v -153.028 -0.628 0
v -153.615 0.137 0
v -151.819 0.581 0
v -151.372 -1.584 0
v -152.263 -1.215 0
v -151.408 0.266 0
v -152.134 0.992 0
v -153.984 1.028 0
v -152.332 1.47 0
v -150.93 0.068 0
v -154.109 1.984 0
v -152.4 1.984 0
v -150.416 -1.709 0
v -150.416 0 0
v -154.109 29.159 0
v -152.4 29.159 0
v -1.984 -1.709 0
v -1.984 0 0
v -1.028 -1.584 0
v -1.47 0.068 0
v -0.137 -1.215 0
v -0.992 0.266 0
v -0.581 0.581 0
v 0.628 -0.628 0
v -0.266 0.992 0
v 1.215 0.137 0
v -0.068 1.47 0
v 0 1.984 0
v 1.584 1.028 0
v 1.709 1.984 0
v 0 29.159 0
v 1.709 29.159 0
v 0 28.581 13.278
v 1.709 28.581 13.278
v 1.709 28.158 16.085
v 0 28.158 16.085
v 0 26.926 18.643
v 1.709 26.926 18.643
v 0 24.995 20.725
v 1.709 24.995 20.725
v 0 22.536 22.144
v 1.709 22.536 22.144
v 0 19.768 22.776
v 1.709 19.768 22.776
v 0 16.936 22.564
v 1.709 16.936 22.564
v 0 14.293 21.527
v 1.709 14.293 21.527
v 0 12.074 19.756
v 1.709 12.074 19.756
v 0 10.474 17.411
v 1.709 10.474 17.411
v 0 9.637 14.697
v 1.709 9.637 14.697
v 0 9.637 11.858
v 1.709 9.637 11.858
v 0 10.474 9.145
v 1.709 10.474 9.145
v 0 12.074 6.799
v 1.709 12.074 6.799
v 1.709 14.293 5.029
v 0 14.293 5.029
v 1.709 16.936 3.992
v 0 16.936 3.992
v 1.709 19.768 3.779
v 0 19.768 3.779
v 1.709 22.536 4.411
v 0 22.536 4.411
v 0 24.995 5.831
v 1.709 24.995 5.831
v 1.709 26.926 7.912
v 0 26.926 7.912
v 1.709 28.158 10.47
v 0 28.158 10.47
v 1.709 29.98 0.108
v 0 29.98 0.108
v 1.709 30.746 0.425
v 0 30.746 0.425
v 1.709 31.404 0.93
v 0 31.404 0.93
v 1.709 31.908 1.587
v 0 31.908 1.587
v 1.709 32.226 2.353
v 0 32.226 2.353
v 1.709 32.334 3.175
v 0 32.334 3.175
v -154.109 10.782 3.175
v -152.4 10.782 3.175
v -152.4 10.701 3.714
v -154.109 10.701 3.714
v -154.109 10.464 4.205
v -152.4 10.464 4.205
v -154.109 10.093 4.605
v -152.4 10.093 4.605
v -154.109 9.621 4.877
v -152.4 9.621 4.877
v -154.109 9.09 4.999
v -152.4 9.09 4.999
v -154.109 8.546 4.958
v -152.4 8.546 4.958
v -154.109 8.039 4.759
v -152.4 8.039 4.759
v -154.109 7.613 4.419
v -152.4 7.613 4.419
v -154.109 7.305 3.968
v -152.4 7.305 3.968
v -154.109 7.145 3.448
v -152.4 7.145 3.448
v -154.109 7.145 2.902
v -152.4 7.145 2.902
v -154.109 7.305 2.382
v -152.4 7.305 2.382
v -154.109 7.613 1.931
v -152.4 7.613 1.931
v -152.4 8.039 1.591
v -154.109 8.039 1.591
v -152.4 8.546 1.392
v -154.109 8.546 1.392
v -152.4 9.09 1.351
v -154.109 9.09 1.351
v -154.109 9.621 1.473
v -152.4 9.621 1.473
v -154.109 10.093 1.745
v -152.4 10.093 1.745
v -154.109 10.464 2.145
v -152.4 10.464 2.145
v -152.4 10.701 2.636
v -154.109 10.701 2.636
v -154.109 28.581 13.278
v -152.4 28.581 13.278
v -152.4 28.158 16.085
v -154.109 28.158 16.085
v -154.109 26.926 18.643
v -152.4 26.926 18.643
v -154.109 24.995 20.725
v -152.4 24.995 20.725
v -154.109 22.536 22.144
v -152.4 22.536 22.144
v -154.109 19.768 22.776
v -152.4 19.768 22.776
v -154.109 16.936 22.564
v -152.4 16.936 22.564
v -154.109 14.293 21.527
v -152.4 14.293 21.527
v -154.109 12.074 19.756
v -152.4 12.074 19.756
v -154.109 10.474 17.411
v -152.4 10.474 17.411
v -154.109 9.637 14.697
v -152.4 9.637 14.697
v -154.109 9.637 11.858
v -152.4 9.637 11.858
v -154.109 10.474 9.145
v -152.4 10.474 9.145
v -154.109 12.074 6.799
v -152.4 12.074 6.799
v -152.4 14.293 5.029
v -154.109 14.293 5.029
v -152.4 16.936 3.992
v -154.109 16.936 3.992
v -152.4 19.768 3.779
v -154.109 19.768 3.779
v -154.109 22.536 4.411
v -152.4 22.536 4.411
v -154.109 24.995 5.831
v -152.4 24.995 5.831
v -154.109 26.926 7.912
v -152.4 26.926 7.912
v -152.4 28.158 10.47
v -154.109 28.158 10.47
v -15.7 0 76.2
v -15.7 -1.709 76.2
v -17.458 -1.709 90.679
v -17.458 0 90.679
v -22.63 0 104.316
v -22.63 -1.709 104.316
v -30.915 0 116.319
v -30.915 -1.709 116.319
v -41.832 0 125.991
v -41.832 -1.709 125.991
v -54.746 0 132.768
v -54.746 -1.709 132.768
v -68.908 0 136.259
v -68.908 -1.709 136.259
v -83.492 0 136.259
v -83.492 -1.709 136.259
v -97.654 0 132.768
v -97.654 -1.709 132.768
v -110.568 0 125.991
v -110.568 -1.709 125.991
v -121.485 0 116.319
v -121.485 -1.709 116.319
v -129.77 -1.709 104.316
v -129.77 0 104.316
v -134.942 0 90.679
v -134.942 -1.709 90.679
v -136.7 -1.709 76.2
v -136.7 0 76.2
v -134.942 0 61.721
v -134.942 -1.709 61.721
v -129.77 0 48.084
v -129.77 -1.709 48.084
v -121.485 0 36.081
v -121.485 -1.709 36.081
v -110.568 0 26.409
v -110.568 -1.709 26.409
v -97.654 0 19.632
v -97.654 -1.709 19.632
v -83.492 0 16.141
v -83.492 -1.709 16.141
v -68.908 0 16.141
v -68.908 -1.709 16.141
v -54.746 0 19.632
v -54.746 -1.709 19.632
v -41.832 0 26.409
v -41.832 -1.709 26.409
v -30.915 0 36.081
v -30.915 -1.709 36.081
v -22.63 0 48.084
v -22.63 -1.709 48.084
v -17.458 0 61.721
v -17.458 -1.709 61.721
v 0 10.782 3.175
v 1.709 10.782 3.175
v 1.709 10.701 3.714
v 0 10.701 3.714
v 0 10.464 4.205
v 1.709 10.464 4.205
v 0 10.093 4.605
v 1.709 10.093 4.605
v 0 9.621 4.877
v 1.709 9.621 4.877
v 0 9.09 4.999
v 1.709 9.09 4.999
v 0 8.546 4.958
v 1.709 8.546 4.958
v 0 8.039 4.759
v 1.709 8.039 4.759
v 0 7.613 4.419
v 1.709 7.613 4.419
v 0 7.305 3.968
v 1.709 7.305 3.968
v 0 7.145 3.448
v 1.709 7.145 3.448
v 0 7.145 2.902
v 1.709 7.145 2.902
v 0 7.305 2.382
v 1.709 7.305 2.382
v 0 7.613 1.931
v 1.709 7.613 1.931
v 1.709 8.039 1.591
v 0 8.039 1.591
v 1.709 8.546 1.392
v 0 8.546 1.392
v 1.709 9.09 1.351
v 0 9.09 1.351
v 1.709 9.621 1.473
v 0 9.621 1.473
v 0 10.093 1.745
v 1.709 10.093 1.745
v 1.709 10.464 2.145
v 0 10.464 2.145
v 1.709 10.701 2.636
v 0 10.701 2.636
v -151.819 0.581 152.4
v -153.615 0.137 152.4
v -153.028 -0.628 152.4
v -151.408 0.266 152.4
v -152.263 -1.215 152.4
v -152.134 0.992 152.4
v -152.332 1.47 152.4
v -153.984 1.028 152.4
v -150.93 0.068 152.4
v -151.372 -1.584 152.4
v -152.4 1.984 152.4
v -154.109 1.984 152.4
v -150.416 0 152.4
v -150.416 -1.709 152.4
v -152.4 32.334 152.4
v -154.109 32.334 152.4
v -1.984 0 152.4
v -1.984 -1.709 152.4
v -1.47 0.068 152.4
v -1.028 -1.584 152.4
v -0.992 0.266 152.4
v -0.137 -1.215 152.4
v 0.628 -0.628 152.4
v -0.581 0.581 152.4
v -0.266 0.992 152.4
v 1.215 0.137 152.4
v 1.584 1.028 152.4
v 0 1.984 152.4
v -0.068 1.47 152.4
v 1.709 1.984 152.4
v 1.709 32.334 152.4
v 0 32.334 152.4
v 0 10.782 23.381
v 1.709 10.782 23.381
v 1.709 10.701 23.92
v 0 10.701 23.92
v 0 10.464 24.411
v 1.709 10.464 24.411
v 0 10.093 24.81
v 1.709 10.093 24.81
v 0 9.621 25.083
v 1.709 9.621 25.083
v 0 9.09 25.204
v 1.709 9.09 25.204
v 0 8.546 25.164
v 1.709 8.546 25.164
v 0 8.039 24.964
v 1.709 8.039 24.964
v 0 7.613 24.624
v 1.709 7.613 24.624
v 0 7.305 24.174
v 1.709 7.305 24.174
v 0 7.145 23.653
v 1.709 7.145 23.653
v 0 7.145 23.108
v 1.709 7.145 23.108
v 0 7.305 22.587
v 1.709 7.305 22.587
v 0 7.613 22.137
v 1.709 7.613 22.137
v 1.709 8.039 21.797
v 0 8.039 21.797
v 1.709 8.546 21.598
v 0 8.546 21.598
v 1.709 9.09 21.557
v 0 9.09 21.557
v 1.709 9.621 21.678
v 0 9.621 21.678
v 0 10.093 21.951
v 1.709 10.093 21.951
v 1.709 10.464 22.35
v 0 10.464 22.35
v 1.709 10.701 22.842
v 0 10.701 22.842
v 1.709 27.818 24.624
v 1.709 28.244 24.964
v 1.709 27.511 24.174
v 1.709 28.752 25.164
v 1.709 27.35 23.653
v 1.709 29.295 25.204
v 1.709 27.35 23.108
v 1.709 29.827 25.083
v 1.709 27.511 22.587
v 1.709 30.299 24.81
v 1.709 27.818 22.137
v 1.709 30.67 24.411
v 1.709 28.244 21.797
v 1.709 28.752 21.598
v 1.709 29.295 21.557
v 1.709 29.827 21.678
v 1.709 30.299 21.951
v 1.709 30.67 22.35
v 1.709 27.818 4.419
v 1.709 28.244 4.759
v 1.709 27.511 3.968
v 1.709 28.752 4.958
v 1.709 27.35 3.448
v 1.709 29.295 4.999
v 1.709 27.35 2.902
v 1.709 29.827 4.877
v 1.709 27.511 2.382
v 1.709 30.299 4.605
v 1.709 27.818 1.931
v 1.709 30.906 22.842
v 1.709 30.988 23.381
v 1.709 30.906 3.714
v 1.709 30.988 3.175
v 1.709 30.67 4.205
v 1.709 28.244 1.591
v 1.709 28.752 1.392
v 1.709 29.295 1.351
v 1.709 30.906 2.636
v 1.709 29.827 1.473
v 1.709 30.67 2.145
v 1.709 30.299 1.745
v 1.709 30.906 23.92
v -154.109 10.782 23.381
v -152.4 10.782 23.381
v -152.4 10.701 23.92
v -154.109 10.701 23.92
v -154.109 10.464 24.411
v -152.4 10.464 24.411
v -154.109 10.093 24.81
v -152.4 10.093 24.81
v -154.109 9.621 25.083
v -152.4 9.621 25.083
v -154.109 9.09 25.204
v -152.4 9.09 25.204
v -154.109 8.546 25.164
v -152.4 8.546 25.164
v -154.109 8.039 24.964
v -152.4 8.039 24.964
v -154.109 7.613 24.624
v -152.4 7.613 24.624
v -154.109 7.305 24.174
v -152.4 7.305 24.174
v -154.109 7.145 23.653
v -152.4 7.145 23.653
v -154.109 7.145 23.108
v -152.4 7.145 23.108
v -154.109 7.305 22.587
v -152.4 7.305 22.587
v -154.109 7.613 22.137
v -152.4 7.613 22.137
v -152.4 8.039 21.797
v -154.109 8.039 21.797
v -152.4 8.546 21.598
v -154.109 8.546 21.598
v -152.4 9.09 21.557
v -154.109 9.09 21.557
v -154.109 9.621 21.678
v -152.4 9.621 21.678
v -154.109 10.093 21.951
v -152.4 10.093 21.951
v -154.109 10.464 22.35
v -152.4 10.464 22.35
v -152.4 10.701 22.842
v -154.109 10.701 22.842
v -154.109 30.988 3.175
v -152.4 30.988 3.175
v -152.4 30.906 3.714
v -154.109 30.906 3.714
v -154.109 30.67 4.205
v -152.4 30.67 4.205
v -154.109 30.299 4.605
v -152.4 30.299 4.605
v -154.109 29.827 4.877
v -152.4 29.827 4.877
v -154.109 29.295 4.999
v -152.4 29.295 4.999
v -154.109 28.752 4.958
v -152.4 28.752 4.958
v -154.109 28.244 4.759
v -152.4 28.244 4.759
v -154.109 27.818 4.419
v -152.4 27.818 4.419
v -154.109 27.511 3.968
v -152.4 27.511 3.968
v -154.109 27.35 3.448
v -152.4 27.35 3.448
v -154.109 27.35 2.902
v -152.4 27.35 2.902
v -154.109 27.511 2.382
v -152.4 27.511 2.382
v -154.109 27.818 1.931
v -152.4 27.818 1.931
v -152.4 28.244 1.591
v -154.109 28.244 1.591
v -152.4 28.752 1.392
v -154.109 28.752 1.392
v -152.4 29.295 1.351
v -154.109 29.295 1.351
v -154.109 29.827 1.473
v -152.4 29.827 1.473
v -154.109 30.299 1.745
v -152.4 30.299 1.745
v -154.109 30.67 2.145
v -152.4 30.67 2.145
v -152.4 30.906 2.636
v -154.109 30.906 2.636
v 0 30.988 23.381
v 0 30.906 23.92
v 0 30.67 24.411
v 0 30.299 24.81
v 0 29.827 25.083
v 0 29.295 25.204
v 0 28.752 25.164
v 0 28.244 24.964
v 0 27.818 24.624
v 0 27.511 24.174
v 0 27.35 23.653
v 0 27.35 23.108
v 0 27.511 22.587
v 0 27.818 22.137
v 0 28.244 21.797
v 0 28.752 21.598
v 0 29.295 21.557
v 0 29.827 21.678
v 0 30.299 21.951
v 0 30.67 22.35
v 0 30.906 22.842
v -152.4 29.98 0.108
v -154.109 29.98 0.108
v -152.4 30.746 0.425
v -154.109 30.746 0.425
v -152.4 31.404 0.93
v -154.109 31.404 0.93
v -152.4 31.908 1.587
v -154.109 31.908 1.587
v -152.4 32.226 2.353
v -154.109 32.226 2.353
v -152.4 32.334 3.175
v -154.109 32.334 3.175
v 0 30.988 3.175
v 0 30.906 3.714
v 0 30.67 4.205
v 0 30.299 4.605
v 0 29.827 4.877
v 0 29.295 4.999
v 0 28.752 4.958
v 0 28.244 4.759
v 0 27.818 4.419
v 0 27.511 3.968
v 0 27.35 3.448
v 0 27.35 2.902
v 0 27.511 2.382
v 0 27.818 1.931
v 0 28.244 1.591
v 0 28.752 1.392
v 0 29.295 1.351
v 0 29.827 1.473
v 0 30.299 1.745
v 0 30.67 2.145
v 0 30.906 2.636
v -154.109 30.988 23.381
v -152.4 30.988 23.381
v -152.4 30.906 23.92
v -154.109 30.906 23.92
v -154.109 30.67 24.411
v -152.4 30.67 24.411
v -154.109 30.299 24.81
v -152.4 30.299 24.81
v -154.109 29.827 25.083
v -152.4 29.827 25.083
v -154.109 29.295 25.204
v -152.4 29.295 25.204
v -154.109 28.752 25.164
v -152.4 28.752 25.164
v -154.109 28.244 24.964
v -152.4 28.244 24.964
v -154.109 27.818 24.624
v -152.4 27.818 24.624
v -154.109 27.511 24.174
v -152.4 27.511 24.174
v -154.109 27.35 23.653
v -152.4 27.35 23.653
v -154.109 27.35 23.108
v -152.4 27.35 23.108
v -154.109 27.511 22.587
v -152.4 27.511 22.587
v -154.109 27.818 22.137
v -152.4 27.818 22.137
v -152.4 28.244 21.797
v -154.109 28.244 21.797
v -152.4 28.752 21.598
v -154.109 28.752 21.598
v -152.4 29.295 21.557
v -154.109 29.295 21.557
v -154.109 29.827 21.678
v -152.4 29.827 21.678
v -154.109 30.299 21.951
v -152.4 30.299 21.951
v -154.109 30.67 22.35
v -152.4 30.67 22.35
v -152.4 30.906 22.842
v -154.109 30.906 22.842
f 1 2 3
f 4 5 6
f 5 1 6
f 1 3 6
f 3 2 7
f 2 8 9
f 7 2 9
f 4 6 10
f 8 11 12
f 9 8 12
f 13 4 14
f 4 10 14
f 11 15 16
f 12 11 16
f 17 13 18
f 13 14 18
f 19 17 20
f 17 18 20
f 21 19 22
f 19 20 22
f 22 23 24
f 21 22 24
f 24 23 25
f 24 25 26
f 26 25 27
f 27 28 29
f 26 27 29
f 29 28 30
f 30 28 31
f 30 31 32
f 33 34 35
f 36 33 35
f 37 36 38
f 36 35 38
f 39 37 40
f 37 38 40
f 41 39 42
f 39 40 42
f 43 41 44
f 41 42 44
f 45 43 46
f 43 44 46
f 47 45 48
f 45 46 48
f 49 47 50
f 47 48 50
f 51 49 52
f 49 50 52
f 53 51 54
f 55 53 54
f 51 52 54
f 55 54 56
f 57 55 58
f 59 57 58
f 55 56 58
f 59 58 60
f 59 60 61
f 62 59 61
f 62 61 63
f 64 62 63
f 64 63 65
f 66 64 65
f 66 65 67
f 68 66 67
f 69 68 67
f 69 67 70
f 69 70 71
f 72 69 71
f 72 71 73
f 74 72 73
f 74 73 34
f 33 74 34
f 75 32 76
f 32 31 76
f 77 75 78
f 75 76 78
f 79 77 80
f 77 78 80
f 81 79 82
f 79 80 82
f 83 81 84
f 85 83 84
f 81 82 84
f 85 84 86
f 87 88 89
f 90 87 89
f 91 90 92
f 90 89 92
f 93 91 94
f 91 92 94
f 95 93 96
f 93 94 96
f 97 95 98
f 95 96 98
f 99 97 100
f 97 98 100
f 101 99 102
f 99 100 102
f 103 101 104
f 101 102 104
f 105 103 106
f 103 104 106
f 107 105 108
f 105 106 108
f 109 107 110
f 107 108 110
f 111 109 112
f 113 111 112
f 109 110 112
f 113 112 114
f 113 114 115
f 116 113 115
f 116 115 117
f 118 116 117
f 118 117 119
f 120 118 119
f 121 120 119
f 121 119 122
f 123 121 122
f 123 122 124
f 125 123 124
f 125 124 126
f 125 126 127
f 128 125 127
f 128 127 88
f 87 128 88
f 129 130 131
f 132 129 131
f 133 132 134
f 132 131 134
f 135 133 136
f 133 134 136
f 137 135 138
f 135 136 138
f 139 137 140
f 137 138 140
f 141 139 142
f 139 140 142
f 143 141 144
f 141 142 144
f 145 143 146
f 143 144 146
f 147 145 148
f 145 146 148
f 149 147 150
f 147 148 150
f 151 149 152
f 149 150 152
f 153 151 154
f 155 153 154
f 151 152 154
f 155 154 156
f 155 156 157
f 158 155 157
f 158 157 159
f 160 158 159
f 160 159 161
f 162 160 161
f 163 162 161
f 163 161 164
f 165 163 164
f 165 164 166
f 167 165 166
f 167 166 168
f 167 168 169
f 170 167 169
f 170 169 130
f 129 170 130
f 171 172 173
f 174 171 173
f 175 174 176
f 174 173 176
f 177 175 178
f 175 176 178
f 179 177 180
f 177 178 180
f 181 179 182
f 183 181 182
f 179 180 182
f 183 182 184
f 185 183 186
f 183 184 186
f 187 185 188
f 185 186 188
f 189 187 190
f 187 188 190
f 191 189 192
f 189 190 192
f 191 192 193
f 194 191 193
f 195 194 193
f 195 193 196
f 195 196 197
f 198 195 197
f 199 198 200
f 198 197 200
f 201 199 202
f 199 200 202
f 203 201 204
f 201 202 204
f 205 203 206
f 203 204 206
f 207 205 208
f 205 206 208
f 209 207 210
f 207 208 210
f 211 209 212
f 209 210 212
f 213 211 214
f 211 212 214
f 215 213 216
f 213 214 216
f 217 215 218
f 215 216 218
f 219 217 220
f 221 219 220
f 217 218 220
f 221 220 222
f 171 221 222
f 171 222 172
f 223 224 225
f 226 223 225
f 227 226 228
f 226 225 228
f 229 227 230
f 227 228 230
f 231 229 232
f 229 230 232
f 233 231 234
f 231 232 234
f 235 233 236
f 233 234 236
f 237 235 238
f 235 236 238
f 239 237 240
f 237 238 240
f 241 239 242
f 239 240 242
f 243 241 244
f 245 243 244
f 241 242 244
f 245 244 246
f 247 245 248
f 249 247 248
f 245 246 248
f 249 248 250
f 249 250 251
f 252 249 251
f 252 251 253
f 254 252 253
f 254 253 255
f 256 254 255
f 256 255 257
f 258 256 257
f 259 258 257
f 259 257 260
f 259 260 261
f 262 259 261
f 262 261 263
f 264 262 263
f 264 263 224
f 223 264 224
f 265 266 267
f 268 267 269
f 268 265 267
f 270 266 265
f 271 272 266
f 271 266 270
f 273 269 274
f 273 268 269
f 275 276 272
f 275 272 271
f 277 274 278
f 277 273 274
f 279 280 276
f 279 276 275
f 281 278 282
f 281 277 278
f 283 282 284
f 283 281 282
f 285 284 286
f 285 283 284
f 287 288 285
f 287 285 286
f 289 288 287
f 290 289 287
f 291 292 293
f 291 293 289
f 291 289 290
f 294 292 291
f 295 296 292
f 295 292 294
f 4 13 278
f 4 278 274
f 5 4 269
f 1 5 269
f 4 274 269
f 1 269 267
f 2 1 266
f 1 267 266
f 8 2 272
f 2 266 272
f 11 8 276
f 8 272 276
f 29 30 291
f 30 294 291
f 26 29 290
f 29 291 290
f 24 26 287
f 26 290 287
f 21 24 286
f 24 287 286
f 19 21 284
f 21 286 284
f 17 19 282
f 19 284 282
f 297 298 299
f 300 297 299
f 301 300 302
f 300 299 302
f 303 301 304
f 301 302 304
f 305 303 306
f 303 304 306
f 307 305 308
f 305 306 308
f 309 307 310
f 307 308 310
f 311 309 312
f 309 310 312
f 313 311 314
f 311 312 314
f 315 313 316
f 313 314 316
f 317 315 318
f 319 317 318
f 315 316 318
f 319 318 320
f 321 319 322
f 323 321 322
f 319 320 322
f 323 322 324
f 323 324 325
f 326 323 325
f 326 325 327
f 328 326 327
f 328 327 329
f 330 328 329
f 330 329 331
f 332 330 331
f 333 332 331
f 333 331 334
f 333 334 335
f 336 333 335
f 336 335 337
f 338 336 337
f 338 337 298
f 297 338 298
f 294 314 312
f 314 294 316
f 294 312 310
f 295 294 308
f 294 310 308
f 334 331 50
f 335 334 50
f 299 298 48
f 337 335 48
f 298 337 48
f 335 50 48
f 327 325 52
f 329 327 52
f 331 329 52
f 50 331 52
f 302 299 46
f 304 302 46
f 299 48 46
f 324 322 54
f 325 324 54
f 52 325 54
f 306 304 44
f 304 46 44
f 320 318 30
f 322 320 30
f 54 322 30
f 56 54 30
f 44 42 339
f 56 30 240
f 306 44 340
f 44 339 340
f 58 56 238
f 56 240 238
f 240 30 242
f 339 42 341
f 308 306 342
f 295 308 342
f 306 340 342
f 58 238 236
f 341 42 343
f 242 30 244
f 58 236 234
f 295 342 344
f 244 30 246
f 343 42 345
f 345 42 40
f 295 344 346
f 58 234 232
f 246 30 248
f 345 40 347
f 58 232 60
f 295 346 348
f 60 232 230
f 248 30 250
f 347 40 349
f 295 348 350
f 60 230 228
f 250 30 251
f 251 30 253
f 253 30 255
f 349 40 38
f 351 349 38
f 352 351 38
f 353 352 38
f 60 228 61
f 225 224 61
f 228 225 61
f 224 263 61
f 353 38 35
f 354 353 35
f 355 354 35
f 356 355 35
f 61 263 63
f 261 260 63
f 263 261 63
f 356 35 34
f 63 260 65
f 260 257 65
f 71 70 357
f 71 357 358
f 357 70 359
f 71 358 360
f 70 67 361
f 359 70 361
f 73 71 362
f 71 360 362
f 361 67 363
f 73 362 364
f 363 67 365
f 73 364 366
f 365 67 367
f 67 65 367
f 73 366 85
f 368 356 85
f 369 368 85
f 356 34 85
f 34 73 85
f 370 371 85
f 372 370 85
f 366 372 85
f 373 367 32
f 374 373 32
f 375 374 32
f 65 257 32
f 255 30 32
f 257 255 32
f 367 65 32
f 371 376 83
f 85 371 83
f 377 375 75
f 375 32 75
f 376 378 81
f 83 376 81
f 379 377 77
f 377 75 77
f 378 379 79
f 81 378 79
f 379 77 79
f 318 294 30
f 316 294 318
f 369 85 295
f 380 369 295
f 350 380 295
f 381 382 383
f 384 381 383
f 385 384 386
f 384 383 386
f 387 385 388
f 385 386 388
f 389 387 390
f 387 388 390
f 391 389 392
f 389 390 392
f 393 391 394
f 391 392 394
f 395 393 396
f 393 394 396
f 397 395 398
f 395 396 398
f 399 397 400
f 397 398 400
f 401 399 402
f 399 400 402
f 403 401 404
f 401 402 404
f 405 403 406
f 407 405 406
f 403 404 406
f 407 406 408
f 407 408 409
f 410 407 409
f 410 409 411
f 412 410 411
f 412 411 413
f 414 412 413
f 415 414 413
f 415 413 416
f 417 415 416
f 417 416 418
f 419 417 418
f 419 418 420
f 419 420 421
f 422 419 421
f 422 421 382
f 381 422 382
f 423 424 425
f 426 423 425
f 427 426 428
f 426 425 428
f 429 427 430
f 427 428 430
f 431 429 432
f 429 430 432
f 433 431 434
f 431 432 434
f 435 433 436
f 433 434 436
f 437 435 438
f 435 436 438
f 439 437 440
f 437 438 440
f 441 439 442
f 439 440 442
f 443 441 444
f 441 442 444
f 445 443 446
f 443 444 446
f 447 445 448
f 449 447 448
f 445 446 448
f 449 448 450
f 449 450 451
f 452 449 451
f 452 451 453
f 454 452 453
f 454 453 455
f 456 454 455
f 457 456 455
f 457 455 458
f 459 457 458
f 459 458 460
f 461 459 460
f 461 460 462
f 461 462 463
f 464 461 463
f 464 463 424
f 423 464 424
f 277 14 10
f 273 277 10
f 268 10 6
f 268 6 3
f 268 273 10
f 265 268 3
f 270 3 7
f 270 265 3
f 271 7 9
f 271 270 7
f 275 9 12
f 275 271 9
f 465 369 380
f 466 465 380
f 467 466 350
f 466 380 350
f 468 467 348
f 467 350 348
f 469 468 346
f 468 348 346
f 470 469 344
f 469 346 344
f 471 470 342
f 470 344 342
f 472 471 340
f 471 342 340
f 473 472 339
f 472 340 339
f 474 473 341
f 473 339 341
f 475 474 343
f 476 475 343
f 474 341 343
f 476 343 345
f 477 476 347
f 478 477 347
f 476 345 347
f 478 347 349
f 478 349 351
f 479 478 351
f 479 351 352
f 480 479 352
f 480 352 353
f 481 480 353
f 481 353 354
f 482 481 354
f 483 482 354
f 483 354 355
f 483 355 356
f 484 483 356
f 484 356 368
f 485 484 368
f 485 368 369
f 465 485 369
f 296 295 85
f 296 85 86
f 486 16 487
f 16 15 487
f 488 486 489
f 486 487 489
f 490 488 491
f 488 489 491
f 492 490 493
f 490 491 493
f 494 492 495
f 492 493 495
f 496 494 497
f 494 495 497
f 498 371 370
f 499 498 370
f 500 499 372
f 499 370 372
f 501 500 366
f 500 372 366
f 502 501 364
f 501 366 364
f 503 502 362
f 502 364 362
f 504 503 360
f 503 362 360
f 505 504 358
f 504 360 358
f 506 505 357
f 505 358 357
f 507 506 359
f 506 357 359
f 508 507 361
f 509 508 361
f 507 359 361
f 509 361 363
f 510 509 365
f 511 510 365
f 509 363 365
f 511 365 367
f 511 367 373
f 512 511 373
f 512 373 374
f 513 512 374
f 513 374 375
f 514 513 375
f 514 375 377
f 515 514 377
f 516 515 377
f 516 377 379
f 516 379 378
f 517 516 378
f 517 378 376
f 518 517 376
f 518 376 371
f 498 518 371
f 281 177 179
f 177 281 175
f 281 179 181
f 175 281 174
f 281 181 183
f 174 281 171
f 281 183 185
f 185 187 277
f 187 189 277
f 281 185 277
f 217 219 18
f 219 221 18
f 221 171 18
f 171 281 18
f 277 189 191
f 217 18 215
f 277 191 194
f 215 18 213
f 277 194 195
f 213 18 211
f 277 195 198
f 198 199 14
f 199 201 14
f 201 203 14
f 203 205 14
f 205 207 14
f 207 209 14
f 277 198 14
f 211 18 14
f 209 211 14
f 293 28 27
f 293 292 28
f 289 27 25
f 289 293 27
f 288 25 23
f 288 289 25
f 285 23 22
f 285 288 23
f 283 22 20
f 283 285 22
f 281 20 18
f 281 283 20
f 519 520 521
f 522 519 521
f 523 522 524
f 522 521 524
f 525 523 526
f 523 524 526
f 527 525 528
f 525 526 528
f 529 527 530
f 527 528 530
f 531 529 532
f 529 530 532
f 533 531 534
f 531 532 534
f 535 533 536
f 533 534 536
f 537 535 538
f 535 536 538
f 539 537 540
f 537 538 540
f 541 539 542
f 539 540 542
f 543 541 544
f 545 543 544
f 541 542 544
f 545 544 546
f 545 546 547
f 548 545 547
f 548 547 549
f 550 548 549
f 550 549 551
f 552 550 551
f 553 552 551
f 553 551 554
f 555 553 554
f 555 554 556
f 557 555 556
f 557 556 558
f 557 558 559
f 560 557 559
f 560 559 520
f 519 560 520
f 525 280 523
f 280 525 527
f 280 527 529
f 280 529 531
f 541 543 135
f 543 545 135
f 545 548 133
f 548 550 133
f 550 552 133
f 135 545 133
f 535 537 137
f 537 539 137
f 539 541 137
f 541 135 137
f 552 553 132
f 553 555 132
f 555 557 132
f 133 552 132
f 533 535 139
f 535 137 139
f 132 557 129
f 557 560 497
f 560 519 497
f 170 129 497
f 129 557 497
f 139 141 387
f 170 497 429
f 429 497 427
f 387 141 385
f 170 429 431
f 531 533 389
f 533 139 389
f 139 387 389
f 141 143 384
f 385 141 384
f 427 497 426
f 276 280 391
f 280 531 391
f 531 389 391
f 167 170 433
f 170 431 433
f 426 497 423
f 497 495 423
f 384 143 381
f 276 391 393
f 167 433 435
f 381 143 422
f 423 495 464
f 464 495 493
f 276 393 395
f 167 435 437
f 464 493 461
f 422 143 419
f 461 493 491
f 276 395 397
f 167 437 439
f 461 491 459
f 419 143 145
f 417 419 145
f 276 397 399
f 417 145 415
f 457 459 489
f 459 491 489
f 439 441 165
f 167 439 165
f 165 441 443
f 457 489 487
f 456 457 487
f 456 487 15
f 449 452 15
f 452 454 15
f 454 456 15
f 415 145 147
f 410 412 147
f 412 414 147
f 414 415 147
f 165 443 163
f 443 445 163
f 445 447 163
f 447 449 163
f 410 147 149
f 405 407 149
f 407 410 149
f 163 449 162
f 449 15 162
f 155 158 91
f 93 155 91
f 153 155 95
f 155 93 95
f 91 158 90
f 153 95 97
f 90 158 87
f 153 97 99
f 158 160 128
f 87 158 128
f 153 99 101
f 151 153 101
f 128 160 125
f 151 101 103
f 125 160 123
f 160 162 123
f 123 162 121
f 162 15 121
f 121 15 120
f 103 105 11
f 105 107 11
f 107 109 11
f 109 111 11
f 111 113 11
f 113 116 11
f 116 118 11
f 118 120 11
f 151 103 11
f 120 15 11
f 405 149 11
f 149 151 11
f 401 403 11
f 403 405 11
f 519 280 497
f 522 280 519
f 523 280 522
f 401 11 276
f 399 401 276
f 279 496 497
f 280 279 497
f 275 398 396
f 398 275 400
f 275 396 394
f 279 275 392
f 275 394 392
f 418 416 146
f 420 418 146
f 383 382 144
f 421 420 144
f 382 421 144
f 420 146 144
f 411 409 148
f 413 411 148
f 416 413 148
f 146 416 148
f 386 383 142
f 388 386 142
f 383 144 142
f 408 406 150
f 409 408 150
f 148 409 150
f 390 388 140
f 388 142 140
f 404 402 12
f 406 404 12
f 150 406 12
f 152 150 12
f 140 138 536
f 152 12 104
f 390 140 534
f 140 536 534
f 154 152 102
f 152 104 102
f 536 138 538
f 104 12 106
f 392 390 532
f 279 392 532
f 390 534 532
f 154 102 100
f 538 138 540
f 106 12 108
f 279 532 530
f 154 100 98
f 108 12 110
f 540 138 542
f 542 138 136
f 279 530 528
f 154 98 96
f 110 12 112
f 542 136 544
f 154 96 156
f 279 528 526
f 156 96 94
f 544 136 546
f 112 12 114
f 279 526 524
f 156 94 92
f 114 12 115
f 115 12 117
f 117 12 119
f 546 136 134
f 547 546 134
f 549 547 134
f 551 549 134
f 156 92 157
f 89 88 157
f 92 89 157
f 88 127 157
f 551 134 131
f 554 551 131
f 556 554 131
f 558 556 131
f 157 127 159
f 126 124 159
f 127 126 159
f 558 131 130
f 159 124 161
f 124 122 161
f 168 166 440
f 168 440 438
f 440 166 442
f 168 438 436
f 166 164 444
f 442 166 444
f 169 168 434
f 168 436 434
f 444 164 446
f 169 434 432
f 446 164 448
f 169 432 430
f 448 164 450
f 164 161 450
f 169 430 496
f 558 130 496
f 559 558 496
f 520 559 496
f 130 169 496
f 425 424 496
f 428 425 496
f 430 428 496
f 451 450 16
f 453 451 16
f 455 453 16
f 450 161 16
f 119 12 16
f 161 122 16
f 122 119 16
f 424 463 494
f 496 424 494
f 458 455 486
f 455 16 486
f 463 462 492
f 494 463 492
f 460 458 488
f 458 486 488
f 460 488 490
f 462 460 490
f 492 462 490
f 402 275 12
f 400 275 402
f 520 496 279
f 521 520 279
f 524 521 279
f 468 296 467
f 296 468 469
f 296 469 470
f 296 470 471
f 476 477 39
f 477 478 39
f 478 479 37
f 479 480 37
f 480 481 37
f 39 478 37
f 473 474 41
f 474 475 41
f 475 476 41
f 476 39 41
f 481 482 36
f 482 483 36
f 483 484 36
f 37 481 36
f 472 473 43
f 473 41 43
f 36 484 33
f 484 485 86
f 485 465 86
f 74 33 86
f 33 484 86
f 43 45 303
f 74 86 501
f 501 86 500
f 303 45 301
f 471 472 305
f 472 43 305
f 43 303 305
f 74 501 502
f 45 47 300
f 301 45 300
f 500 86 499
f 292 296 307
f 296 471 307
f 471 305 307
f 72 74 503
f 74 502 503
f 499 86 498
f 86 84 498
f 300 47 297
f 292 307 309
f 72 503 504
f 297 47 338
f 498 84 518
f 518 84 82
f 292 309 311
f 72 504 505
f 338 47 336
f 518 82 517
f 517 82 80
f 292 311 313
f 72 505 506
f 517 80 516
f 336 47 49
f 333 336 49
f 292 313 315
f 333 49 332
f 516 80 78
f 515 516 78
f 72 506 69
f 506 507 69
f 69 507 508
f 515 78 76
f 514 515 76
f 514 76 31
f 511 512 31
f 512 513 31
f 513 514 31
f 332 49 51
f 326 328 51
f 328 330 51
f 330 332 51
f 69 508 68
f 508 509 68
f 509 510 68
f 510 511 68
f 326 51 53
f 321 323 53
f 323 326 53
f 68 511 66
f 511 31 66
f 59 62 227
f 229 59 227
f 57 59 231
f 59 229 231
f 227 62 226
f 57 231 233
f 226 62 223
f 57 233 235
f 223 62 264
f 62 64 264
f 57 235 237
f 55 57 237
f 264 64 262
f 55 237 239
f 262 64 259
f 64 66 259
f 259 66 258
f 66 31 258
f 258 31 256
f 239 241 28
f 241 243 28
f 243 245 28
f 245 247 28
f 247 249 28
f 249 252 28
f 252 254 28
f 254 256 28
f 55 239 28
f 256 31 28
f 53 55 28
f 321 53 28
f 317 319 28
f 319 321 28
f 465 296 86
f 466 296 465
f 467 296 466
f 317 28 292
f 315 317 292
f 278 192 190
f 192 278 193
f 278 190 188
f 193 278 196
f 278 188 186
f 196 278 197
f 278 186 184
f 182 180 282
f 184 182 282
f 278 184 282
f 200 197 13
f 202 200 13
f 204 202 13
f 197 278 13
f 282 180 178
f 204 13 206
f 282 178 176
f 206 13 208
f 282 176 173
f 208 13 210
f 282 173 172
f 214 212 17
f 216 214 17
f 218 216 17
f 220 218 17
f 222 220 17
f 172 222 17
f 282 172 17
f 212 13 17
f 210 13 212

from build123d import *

# Parameters (mm, degrees)
F1_DEPTH = 152.4
F2_R     = 1.98374
F3_R     = 3.69316
F4_R     = 3.175
F5_R     = 9.525
F5_R_2   = 1.8288
F6_DEPTH = 155.81884
F7_R     = 60.500006
F8_DEPTH = 1.70942


with BuildPart() as f1:
    # F0 (on Top) → F1 (new body)
    with BuildSketch(Plane.XY):
        Polygon((0, 32.3337428), (0, 0), (-152.4, 0), (-152.4, 32.3337428), (-154.10942, 32.3337428), (-154.10942, -1.70942), (1.70942, -1.70942), (1.70942, 32.3337428), align=None)
    extrude(amount=F1_DEPTH)

    # F2
    f2_edges = [f1.edges().sort_by_distance(p)[0] for p in [
        (0, 0, 76.2),
        (-152.4, 0, 76.2),
    ]]
    fillet(f2_edges, radius=F2_R)

    # F3
    f3_edges = [f1.edges().sort_by_distance(p)[0] for p in [
        (1.70942, -1.70942, 76.2),
        (-154.10942, -1.70942, 76.2),
    ]]
    fillet(f3_edges, radius=F3_R)

    # F4
    f4_edges = [f1.edges().sort_by_distance(p)[0] for p in [
        (-153.25471, 32.333743, 0),
        (0.85471, 32.333743, 0),
    ]]
    fillet(f4_edges, radius=F4_R)

    # F5 (on face) → F6 (cut, through all)
    with BuildSketch(Plane.YZ.offset(1.70942)):
        with Locations((19.0559546638, 13.2777881362)):
            Circle(F5_R)
        with Locations((29.1587428, 23.3805762724)):
            Circle(F5_R_2)
        with Locations((29.1587428, 3.175)):
            Circle(F5_R_2)
        with Locations((8.9531665276, 3.175)):
            Circle(F5_R_2)
        with Locations((8.9531665276, 23.3805762724)):
            Circle(F5_R_2)
    extrude(amount=-F6_DEPTH, mode=Mode.SUBTRACT)

    # F7 (on face) → F8 (cut, through all)
    with BuildSketch(Plane.XZ.offset(1.70942)):
        with Locations((-76.2, 76.2)):
            Circle(F7_R)
    extrude(amount=-F8_DEPTH, mode=Mode.SUBTRACT)


solid = f1.part
